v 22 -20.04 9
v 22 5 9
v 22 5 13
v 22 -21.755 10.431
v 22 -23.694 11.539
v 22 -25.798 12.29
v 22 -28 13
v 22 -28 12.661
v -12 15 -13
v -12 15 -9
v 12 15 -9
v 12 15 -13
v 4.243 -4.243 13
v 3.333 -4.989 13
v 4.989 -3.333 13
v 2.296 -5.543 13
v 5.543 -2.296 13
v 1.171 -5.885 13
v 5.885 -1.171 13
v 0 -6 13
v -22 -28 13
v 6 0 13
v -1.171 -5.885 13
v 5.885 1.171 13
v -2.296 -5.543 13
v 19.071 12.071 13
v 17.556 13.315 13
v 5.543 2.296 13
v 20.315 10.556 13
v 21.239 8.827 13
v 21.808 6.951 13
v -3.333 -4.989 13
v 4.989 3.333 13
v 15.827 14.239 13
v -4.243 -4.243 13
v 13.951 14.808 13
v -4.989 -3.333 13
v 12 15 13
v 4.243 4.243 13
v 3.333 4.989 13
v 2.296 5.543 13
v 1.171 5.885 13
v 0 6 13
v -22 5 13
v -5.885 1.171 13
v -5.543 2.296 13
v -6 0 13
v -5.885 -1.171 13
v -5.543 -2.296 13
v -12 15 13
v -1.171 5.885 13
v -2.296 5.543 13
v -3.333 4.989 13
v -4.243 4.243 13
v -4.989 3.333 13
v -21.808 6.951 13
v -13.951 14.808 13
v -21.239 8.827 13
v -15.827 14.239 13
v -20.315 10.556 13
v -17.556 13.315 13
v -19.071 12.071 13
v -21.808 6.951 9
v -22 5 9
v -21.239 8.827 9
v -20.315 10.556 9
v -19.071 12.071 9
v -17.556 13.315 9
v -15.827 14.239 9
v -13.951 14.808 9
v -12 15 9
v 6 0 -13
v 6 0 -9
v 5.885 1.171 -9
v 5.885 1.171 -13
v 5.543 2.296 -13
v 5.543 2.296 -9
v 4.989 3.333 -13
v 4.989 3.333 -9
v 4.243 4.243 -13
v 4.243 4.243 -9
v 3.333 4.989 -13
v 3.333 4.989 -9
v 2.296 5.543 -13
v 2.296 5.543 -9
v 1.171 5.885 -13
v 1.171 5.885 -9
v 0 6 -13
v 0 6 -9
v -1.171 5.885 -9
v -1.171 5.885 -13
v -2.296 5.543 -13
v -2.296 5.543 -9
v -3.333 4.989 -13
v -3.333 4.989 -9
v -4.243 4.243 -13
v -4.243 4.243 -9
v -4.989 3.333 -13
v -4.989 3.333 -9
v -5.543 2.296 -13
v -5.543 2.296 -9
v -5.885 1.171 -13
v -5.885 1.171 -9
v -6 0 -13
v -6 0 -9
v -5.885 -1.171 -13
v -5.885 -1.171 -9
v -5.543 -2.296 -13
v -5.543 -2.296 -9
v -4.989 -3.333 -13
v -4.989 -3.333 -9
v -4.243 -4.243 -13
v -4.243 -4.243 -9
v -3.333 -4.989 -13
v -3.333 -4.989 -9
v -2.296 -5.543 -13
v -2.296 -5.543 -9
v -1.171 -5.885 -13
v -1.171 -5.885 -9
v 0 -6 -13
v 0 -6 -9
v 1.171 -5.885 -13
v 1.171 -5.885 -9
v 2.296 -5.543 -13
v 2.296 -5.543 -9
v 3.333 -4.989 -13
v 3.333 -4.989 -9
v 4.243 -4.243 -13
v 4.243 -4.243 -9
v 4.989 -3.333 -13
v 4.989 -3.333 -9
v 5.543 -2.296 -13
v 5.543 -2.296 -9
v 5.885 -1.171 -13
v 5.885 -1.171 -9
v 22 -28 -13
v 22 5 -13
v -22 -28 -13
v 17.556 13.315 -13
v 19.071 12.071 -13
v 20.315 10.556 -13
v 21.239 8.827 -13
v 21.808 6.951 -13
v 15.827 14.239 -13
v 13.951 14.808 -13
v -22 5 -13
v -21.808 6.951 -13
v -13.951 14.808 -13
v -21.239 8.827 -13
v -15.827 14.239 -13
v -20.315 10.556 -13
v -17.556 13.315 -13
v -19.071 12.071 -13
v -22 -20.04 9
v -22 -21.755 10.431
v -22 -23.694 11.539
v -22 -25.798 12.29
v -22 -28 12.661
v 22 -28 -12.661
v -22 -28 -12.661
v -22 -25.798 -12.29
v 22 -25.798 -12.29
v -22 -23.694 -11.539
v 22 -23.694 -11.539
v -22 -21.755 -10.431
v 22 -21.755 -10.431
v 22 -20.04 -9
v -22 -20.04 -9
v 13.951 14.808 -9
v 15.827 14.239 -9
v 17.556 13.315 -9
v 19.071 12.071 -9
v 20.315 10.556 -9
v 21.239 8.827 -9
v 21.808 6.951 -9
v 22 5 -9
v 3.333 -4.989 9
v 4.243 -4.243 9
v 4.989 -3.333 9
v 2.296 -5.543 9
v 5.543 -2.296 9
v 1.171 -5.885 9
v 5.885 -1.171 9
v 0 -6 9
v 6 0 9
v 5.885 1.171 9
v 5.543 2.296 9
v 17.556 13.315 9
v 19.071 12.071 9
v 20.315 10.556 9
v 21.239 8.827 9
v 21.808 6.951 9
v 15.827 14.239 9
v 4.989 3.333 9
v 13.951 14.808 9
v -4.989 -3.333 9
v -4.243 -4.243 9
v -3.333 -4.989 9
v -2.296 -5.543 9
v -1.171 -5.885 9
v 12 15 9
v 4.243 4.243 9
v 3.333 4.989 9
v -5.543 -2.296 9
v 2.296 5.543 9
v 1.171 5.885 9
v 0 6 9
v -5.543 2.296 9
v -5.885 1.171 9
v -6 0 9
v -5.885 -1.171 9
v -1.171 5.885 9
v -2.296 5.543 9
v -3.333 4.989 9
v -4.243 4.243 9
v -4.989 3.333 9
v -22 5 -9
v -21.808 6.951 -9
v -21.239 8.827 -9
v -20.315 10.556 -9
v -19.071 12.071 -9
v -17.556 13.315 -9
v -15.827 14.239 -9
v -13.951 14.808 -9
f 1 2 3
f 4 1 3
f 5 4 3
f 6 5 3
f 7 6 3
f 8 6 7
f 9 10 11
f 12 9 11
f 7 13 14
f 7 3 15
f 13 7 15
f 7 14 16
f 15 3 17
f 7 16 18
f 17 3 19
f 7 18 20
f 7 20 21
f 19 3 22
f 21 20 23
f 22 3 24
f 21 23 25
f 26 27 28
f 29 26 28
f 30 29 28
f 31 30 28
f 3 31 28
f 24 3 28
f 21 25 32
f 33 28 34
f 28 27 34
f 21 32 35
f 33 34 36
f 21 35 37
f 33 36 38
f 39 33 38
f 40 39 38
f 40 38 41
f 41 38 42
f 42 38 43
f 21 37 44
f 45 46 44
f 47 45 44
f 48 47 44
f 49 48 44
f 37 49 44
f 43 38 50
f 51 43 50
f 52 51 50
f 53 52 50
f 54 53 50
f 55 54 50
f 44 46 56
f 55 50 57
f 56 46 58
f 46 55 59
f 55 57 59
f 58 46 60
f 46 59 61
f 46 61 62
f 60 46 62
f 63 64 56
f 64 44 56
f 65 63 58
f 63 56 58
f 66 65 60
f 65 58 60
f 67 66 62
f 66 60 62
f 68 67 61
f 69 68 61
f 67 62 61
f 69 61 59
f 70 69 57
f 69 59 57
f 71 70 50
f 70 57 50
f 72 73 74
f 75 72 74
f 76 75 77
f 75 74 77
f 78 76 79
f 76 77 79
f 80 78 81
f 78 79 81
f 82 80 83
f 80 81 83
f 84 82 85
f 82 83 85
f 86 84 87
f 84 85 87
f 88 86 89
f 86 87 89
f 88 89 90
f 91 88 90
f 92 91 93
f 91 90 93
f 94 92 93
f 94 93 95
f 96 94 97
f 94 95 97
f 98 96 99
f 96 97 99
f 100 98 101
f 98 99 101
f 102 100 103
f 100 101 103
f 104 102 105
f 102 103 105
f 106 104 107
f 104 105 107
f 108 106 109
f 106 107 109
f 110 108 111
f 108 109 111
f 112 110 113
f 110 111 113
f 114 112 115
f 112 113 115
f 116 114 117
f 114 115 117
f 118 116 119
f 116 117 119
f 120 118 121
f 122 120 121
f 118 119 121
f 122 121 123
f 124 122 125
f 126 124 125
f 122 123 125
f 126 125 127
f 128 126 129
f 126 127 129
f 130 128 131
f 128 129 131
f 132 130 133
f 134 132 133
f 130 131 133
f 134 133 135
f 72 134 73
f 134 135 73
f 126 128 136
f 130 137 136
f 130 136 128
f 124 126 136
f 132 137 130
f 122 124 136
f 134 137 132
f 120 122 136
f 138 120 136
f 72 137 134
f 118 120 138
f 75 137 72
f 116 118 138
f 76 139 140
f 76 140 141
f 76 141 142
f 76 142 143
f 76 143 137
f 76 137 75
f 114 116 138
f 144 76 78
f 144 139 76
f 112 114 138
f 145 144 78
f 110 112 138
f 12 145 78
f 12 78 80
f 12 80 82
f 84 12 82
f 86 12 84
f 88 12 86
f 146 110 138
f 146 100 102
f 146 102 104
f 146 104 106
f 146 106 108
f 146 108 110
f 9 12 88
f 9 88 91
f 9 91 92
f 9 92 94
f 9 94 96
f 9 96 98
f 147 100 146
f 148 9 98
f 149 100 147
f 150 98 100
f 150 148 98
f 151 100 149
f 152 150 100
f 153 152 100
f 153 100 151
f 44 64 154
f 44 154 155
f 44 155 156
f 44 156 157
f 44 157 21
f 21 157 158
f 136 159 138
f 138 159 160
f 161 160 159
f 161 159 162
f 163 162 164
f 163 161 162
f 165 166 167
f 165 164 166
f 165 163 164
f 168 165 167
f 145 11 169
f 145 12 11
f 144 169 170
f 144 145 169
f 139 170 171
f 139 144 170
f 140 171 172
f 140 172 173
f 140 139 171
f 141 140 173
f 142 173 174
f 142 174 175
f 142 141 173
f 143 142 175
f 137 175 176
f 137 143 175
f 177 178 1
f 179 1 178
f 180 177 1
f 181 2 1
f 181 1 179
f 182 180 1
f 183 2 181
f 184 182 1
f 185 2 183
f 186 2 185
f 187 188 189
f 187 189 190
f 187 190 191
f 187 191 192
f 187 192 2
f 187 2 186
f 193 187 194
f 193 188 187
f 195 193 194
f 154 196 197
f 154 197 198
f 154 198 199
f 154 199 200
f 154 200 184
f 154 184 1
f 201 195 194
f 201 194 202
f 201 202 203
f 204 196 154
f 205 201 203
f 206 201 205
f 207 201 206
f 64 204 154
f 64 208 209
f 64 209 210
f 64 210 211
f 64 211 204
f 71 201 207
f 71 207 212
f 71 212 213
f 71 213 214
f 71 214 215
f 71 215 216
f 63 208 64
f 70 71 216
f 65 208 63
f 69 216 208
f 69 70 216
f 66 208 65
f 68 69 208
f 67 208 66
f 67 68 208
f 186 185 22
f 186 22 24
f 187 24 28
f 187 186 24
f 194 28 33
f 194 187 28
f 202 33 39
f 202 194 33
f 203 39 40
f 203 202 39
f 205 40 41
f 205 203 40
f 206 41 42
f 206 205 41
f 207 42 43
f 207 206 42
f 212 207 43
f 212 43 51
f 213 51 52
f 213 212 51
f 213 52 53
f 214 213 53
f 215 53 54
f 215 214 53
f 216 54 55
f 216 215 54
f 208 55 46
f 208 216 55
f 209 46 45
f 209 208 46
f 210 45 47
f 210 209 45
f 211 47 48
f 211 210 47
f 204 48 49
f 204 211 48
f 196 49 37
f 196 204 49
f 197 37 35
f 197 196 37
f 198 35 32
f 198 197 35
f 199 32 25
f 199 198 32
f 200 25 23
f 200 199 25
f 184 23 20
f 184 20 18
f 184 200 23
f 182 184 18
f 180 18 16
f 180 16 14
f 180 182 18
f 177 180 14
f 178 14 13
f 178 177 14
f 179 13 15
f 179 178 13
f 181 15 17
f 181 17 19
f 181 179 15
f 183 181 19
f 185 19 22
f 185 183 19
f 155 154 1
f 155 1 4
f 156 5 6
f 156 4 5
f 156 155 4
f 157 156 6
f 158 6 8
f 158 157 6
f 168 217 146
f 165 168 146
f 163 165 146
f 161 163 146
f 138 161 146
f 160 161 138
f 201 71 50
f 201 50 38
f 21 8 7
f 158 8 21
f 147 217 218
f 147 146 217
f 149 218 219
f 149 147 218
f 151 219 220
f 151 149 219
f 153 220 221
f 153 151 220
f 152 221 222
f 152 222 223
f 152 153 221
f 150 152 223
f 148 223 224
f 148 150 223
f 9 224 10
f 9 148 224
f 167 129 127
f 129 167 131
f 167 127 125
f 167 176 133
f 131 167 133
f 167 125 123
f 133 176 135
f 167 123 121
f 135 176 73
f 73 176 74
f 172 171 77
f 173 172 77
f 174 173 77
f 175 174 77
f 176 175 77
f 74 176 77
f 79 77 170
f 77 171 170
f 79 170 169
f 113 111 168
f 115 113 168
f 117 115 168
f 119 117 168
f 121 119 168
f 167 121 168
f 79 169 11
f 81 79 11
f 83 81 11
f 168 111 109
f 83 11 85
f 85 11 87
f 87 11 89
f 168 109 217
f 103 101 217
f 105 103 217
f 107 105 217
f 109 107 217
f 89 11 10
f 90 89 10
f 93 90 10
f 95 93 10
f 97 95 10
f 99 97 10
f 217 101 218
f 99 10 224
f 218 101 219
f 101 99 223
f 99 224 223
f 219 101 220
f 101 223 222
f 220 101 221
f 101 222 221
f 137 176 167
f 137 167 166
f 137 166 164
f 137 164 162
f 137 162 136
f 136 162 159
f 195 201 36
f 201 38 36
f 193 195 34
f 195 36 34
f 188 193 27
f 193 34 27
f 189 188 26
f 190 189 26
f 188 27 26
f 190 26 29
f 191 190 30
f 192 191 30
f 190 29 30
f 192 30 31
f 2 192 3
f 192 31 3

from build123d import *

# Parameters (mm, degrees)
SKETCH2_R               = 6
BOSS_EXTRUDE1_DEPTH     = 4
FILLET1_R               = 10
CUT_EXTRUDE1_DEPTH      = 25
CUT_EXTRUDE1_DEPTH_BACK = 25
SKETCH3_R               = 12.7


with BuildPart() as part:
    # Sketch2 → Boss-Extrude1 (new body)
    with BuildSketch(Plane.XY.offset(9)):
        Polygon((-22, 0), (-22, 15), (22, 15), (22, -28), (-22, -28), align=None)
        Circle(SKETCH2_R, mode=Mode.SUBTRACT)
    extrude(amount=BOSS_EXTRUDE1_DEPTH)

    # Fillet1
    fillet1_edges = [part.edges().sort_by_distance(p)[0] for p in [
        (-22, 15, 11),
        (22, 15, 11),
    ]]
    fillet(fillet1_edges, radius=FILLET1_R)


with BuildPart() as body_2:
    # Mirror2: mirrored copy
    add(part.part.mirror(Plane.XY))


with BuildPart() as cut_extrude1_tool:
    # Sketch3 → Cut-Extrude1 (new, two sides: drawn at the far end of the back side and taken through both)
    with BuildSketch(Plane(origin=(0, 0, 0), x_dir=(0, 0, -1), z_dir=(1, 0, 0)).offset(-CUT_EXTRUDE1_DEPTH_BACK)):
        with Locations((0, -29)):
            Circle(SKETCH3_R)
    extrude(amount=CUT_EXTRUDE1_DEPTH + CUT_EXTRUDE1_DEPTH_BACK)


with BuildPart() as part_1:
    add(part.part)

    # Cut-Extrude1: cut by cut_extrude1_tool
    add(cut_extrude1_tool.part, mode=Mode.SUBTRACT)


with BuildPart() as body_2_1:
    add(body_2.part)

    # Cut-Extrude1: cut by cut_extrude1_tool
    add(cut_extrude1_tool.part, mode=Mode.SUBTRACT)


solid = Compound([part_1.part, body_2_1.part])
